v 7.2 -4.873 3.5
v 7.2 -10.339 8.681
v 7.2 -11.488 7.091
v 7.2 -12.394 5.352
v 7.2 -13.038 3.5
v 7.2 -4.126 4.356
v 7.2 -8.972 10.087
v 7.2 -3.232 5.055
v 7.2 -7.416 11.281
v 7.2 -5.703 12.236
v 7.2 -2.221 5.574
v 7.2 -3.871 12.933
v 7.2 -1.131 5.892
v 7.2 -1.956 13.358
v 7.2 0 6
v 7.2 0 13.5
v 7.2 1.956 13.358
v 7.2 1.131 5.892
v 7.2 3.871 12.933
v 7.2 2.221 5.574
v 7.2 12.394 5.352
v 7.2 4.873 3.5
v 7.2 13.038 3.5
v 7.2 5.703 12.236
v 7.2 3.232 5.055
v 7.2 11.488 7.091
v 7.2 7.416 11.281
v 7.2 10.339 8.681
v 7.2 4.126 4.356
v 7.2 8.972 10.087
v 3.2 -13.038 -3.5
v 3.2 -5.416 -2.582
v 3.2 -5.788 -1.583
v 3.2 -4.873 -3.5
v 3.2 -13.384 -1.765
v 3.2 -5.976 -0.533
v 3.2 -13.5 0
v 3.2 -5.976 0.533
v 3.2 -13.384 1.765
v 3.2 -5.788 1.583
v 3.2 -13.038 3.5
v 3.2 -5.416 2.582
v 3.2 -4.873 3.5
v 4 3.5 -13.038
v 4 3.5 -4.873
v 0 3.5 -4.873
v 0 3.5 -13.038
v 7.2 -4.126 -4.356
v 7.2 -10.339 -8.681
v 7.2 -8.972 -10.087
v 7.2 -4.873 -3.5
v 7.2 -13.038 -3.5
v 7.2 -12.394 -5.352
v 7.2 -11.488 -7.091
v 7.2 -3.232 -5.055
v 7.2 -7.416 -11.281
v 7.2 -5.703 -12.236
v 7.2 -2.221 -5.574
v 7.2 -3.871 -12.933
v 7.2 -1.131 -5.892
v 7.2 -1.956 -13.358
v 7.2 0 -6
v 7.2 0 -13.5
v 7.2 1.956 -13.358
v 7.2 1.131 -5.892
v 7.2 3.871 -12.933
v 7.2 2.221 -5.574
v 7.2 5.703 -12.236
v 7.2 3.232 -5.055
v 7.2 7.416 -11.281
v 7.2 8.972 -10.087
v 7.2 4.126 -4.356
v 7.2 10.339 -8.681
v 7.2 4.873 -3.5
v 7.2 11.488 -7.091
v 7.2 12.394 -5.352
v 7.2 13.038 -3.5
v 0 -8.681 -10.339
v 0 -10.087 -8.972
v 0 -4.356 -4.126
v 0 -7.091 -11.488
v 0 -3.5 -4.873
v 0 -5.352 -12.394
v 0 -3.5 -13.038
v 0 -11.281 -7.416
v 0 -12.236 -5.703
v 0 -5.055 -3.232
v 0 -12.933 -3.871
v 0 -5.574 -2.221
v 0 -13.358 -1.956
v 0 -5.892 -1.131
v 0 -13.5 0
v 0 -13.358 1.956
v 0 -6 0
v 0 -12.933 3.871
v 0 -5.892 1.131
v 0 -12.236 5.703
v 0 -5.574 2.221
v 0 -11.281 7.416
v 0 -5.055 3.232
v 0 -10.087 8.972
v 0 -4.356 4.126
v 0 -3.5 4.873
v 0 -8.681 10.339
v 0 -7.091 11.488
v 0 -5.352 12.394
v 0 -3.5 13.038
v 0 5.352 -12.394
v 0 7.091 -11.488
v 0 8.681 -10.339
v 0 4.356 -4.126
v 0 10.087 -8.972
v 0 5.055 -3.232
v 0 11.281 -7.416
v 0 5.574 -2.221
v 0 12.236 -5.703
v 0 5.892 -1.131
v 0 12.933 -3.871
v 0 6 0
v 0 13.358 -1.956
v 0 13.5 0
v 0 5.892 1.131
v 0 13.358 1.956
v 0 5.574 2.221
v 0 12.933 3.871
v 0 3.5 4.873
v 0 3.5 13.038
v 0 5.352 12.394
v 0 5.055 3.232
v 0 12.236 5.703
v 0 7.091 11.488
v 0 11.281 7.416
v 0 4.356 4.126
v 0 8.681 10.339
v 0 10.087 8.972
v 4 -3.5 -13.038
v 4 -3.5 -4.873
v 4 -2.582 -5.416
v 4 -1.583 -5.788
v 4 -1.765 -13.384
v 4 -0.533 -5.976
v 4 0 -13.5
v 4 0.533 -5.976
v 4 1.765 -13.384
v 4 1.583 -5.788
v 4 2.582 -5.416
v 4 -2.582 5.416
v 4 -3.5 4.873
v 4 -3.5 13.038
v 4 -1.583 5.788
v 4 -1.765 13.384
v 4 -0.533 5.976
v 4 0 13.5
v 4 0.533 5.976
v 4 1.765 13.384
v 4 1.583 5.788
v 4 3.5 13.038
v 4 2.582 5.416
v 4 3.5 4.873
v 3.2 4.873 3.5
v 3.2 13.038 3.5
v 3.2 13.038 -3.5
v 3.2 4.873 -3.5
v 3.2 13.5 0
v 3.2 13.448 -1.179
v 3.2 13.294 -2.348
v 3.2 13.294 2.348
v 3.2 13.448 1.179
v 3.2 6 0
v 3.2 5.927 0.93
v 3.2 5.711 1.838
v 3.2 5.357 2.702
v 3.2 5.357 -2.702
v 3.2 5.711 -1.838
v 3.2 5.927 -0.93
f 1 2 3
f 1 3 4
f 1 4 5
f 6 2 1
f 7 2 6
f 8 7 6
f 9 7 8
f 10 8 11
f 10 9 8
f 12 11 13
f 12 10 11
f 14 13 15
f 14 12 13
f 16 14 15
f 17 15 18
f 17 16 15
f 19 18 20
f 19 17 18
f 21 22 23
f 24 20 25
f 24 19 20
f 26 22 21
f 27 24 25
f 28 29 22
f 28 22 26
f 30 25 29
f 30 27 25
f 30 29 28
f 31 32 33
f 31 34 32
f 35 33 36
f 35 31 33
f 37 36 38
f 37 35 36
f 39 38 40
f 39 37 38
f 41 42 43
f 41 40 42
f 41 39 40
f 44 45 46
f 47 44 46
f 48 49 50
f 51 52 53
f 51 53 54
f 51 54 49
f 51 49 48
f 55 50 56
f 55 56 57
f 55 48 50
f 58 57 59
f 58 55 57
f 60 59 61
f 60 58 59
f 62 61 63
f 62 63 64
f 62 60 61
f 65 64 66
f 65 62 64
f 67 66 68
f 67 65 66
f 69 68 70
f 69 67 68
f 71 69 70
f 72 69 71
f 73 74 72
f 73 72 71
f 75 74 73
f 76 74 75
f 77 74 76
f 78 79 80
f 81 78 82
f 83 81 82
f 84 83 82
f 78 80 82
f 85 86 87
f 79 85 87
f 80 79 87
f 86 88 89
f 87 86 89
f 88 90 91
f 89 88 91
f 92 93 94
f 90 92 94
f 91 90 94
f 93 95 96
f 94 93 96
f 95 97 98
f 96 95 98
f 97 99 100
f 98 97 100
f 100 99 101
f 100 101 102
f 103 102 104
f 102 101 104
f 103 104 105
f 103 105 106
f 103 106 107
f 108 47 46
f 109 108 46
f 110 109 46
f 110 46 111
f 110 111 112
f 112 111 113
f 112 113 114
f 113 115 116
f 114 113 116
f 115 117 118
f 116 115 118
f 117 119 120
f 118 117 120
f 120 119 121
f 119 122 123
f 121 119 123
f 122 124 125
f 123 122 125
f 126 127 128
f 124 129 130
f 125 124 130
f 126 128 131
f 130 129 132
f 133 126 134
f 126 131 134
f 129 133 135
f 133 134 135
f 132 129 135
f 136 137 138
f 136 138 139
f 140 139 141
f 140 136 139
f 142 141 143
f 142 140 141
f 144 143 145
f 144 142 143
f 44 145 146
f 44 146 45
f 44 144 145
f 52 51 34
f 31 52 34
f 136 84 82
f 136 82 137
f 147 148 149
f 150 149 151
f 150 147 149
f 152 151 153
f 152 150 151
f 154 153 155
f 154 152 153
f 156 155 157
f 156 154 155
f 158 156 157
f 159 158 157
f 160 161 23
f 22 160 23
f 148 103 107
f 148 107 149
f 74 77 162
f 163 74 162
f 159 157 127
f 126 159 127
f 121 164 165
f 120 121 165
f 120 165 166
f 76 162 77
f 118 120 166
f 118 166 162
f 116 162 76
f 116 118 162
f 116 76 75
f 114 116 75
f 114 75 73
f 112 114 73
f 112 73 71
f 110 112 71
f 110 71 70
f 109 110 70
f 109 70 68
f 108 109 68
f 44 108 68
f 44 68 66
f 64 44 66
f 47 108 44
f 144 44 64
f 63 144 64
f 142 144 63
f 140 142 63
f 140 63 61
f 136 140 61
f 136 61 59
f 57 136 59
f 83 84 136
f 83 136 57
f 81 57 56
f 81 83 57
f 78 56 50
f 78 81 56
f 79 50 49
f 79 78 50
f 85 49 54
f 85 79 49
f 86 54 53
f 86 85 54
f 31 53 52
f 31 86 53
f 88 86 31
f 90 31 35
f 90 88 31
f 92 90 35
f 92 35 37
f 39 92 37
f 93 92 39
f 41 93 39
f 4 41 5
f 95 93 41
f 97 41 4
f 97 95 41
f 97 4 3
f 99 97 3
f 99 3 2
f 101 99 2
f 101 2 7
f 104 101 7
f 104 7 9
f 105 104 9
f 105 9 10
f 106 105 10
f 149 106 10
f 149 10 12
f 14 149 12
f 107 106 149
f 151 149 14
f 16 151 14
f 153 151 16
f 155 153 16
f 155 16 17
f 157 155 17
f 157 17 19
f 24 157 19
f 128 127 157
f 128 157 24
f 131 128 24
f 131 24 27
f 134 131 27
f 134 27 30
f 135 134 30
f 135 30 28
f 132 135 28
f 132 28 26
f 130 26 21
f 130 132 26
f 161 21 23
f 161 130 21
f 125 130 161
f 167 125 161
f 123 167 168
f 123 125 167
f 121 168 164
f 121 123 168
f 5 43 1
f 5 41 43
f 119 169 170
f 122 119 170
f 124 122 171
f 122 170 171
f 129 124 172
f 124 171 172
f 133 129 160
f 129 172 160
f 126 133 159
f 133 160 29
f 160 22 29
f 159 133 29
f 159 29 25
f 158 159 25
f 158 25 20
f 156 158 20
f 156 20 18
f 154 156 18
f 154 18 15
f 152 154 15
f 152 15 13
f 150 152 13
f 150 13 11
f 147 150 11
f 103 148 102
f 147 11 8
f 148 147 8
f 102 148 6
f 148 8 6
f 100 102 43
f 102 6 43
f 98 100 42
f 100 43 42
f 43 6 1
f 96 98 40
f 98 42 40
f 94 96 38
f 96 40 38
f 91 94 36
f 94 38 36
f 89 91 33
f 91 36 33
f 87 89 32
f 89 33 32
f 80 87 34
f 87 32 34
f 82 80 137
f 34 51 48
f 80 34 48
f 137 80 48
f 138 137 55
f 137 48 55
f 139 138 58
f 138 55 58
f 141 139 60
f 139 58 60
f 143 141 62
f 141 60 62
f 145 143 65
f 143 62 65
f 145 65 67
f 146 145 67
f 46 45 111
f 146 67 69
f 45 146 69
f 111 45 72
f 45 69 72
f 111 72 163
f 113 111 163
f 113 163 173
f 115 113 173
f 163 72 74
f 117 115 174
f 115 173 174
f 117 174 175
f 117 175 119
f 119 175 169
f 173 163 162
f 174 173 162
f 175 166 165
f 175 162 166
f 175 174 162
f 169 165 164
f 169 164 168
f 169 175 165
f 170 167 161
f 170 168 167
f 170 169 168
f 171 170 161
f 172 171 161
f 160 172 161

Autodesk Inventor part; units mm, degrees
sketch "Sketch_1" plane through (0, 0, 0) normal (0, 0, 1) x (1, 0, 0)
  line L0 (7.2, 0) -> (0, 0)
  line L1 (0, 6) -> (7.2, 6)
  line L2 (7.2, 6) -> (7.2, 13.5)
  line L3 (7.2, 13.5) -> (0, 13.5)
  line L4 (0, 13.5) -> (0, 6)
revolve "Revolution1" add sketch "Sketch_1" angle 360 about axis through (7.2, 0, 0) along (1, 0, 0)
sketch "Sketch_2" plane through (0, 0, 0) normal (0, 0, 1) x (1, 0, 0)
  line L0 (0, 3.5) -> (0, -3.5)
  line L1 (0, -3.5) -> (4, -3.5)
  line L2 (4, -3.5) -> (4, 3.5)
  line L3 (4, 3.5) -> (0, 3.5)
extrude "Extrusion1" cut sketch "Sketch_2" along normal mid plane 27
sketch "Sketch_3" plane through (0, 0, 0) normal (0, 1, 0) x (-1, 0, 0)
  line L0 (-3.2, 3.5) -> (-7.2, 3.5)
  line L1 (-7.2, 3.5) -> (-7.2, -3.5)
  line L2 (-7.2, -3.5) -> (-3.2, -3.5)
  line L3 (-3.2, -3.5) -> (-3.2, 3.5)
extrude "Extrusion2" cut sketch "Sketch_3" along normal mid plane 27
ref_plane "C_XY" through (3.6, 0, 0) normal (1, 0, 0) x (0, 0, -1)
ref_plane "C_YZ" through (3.6, 0, 0) normal (0, 0, -1) x (0, 1, 0)
ref_plane "C_ZX" through (3.6, 0, 0) normal (0, 1, 0) x (1, 0, 0)
properties part number "MCOC_spacer26"
